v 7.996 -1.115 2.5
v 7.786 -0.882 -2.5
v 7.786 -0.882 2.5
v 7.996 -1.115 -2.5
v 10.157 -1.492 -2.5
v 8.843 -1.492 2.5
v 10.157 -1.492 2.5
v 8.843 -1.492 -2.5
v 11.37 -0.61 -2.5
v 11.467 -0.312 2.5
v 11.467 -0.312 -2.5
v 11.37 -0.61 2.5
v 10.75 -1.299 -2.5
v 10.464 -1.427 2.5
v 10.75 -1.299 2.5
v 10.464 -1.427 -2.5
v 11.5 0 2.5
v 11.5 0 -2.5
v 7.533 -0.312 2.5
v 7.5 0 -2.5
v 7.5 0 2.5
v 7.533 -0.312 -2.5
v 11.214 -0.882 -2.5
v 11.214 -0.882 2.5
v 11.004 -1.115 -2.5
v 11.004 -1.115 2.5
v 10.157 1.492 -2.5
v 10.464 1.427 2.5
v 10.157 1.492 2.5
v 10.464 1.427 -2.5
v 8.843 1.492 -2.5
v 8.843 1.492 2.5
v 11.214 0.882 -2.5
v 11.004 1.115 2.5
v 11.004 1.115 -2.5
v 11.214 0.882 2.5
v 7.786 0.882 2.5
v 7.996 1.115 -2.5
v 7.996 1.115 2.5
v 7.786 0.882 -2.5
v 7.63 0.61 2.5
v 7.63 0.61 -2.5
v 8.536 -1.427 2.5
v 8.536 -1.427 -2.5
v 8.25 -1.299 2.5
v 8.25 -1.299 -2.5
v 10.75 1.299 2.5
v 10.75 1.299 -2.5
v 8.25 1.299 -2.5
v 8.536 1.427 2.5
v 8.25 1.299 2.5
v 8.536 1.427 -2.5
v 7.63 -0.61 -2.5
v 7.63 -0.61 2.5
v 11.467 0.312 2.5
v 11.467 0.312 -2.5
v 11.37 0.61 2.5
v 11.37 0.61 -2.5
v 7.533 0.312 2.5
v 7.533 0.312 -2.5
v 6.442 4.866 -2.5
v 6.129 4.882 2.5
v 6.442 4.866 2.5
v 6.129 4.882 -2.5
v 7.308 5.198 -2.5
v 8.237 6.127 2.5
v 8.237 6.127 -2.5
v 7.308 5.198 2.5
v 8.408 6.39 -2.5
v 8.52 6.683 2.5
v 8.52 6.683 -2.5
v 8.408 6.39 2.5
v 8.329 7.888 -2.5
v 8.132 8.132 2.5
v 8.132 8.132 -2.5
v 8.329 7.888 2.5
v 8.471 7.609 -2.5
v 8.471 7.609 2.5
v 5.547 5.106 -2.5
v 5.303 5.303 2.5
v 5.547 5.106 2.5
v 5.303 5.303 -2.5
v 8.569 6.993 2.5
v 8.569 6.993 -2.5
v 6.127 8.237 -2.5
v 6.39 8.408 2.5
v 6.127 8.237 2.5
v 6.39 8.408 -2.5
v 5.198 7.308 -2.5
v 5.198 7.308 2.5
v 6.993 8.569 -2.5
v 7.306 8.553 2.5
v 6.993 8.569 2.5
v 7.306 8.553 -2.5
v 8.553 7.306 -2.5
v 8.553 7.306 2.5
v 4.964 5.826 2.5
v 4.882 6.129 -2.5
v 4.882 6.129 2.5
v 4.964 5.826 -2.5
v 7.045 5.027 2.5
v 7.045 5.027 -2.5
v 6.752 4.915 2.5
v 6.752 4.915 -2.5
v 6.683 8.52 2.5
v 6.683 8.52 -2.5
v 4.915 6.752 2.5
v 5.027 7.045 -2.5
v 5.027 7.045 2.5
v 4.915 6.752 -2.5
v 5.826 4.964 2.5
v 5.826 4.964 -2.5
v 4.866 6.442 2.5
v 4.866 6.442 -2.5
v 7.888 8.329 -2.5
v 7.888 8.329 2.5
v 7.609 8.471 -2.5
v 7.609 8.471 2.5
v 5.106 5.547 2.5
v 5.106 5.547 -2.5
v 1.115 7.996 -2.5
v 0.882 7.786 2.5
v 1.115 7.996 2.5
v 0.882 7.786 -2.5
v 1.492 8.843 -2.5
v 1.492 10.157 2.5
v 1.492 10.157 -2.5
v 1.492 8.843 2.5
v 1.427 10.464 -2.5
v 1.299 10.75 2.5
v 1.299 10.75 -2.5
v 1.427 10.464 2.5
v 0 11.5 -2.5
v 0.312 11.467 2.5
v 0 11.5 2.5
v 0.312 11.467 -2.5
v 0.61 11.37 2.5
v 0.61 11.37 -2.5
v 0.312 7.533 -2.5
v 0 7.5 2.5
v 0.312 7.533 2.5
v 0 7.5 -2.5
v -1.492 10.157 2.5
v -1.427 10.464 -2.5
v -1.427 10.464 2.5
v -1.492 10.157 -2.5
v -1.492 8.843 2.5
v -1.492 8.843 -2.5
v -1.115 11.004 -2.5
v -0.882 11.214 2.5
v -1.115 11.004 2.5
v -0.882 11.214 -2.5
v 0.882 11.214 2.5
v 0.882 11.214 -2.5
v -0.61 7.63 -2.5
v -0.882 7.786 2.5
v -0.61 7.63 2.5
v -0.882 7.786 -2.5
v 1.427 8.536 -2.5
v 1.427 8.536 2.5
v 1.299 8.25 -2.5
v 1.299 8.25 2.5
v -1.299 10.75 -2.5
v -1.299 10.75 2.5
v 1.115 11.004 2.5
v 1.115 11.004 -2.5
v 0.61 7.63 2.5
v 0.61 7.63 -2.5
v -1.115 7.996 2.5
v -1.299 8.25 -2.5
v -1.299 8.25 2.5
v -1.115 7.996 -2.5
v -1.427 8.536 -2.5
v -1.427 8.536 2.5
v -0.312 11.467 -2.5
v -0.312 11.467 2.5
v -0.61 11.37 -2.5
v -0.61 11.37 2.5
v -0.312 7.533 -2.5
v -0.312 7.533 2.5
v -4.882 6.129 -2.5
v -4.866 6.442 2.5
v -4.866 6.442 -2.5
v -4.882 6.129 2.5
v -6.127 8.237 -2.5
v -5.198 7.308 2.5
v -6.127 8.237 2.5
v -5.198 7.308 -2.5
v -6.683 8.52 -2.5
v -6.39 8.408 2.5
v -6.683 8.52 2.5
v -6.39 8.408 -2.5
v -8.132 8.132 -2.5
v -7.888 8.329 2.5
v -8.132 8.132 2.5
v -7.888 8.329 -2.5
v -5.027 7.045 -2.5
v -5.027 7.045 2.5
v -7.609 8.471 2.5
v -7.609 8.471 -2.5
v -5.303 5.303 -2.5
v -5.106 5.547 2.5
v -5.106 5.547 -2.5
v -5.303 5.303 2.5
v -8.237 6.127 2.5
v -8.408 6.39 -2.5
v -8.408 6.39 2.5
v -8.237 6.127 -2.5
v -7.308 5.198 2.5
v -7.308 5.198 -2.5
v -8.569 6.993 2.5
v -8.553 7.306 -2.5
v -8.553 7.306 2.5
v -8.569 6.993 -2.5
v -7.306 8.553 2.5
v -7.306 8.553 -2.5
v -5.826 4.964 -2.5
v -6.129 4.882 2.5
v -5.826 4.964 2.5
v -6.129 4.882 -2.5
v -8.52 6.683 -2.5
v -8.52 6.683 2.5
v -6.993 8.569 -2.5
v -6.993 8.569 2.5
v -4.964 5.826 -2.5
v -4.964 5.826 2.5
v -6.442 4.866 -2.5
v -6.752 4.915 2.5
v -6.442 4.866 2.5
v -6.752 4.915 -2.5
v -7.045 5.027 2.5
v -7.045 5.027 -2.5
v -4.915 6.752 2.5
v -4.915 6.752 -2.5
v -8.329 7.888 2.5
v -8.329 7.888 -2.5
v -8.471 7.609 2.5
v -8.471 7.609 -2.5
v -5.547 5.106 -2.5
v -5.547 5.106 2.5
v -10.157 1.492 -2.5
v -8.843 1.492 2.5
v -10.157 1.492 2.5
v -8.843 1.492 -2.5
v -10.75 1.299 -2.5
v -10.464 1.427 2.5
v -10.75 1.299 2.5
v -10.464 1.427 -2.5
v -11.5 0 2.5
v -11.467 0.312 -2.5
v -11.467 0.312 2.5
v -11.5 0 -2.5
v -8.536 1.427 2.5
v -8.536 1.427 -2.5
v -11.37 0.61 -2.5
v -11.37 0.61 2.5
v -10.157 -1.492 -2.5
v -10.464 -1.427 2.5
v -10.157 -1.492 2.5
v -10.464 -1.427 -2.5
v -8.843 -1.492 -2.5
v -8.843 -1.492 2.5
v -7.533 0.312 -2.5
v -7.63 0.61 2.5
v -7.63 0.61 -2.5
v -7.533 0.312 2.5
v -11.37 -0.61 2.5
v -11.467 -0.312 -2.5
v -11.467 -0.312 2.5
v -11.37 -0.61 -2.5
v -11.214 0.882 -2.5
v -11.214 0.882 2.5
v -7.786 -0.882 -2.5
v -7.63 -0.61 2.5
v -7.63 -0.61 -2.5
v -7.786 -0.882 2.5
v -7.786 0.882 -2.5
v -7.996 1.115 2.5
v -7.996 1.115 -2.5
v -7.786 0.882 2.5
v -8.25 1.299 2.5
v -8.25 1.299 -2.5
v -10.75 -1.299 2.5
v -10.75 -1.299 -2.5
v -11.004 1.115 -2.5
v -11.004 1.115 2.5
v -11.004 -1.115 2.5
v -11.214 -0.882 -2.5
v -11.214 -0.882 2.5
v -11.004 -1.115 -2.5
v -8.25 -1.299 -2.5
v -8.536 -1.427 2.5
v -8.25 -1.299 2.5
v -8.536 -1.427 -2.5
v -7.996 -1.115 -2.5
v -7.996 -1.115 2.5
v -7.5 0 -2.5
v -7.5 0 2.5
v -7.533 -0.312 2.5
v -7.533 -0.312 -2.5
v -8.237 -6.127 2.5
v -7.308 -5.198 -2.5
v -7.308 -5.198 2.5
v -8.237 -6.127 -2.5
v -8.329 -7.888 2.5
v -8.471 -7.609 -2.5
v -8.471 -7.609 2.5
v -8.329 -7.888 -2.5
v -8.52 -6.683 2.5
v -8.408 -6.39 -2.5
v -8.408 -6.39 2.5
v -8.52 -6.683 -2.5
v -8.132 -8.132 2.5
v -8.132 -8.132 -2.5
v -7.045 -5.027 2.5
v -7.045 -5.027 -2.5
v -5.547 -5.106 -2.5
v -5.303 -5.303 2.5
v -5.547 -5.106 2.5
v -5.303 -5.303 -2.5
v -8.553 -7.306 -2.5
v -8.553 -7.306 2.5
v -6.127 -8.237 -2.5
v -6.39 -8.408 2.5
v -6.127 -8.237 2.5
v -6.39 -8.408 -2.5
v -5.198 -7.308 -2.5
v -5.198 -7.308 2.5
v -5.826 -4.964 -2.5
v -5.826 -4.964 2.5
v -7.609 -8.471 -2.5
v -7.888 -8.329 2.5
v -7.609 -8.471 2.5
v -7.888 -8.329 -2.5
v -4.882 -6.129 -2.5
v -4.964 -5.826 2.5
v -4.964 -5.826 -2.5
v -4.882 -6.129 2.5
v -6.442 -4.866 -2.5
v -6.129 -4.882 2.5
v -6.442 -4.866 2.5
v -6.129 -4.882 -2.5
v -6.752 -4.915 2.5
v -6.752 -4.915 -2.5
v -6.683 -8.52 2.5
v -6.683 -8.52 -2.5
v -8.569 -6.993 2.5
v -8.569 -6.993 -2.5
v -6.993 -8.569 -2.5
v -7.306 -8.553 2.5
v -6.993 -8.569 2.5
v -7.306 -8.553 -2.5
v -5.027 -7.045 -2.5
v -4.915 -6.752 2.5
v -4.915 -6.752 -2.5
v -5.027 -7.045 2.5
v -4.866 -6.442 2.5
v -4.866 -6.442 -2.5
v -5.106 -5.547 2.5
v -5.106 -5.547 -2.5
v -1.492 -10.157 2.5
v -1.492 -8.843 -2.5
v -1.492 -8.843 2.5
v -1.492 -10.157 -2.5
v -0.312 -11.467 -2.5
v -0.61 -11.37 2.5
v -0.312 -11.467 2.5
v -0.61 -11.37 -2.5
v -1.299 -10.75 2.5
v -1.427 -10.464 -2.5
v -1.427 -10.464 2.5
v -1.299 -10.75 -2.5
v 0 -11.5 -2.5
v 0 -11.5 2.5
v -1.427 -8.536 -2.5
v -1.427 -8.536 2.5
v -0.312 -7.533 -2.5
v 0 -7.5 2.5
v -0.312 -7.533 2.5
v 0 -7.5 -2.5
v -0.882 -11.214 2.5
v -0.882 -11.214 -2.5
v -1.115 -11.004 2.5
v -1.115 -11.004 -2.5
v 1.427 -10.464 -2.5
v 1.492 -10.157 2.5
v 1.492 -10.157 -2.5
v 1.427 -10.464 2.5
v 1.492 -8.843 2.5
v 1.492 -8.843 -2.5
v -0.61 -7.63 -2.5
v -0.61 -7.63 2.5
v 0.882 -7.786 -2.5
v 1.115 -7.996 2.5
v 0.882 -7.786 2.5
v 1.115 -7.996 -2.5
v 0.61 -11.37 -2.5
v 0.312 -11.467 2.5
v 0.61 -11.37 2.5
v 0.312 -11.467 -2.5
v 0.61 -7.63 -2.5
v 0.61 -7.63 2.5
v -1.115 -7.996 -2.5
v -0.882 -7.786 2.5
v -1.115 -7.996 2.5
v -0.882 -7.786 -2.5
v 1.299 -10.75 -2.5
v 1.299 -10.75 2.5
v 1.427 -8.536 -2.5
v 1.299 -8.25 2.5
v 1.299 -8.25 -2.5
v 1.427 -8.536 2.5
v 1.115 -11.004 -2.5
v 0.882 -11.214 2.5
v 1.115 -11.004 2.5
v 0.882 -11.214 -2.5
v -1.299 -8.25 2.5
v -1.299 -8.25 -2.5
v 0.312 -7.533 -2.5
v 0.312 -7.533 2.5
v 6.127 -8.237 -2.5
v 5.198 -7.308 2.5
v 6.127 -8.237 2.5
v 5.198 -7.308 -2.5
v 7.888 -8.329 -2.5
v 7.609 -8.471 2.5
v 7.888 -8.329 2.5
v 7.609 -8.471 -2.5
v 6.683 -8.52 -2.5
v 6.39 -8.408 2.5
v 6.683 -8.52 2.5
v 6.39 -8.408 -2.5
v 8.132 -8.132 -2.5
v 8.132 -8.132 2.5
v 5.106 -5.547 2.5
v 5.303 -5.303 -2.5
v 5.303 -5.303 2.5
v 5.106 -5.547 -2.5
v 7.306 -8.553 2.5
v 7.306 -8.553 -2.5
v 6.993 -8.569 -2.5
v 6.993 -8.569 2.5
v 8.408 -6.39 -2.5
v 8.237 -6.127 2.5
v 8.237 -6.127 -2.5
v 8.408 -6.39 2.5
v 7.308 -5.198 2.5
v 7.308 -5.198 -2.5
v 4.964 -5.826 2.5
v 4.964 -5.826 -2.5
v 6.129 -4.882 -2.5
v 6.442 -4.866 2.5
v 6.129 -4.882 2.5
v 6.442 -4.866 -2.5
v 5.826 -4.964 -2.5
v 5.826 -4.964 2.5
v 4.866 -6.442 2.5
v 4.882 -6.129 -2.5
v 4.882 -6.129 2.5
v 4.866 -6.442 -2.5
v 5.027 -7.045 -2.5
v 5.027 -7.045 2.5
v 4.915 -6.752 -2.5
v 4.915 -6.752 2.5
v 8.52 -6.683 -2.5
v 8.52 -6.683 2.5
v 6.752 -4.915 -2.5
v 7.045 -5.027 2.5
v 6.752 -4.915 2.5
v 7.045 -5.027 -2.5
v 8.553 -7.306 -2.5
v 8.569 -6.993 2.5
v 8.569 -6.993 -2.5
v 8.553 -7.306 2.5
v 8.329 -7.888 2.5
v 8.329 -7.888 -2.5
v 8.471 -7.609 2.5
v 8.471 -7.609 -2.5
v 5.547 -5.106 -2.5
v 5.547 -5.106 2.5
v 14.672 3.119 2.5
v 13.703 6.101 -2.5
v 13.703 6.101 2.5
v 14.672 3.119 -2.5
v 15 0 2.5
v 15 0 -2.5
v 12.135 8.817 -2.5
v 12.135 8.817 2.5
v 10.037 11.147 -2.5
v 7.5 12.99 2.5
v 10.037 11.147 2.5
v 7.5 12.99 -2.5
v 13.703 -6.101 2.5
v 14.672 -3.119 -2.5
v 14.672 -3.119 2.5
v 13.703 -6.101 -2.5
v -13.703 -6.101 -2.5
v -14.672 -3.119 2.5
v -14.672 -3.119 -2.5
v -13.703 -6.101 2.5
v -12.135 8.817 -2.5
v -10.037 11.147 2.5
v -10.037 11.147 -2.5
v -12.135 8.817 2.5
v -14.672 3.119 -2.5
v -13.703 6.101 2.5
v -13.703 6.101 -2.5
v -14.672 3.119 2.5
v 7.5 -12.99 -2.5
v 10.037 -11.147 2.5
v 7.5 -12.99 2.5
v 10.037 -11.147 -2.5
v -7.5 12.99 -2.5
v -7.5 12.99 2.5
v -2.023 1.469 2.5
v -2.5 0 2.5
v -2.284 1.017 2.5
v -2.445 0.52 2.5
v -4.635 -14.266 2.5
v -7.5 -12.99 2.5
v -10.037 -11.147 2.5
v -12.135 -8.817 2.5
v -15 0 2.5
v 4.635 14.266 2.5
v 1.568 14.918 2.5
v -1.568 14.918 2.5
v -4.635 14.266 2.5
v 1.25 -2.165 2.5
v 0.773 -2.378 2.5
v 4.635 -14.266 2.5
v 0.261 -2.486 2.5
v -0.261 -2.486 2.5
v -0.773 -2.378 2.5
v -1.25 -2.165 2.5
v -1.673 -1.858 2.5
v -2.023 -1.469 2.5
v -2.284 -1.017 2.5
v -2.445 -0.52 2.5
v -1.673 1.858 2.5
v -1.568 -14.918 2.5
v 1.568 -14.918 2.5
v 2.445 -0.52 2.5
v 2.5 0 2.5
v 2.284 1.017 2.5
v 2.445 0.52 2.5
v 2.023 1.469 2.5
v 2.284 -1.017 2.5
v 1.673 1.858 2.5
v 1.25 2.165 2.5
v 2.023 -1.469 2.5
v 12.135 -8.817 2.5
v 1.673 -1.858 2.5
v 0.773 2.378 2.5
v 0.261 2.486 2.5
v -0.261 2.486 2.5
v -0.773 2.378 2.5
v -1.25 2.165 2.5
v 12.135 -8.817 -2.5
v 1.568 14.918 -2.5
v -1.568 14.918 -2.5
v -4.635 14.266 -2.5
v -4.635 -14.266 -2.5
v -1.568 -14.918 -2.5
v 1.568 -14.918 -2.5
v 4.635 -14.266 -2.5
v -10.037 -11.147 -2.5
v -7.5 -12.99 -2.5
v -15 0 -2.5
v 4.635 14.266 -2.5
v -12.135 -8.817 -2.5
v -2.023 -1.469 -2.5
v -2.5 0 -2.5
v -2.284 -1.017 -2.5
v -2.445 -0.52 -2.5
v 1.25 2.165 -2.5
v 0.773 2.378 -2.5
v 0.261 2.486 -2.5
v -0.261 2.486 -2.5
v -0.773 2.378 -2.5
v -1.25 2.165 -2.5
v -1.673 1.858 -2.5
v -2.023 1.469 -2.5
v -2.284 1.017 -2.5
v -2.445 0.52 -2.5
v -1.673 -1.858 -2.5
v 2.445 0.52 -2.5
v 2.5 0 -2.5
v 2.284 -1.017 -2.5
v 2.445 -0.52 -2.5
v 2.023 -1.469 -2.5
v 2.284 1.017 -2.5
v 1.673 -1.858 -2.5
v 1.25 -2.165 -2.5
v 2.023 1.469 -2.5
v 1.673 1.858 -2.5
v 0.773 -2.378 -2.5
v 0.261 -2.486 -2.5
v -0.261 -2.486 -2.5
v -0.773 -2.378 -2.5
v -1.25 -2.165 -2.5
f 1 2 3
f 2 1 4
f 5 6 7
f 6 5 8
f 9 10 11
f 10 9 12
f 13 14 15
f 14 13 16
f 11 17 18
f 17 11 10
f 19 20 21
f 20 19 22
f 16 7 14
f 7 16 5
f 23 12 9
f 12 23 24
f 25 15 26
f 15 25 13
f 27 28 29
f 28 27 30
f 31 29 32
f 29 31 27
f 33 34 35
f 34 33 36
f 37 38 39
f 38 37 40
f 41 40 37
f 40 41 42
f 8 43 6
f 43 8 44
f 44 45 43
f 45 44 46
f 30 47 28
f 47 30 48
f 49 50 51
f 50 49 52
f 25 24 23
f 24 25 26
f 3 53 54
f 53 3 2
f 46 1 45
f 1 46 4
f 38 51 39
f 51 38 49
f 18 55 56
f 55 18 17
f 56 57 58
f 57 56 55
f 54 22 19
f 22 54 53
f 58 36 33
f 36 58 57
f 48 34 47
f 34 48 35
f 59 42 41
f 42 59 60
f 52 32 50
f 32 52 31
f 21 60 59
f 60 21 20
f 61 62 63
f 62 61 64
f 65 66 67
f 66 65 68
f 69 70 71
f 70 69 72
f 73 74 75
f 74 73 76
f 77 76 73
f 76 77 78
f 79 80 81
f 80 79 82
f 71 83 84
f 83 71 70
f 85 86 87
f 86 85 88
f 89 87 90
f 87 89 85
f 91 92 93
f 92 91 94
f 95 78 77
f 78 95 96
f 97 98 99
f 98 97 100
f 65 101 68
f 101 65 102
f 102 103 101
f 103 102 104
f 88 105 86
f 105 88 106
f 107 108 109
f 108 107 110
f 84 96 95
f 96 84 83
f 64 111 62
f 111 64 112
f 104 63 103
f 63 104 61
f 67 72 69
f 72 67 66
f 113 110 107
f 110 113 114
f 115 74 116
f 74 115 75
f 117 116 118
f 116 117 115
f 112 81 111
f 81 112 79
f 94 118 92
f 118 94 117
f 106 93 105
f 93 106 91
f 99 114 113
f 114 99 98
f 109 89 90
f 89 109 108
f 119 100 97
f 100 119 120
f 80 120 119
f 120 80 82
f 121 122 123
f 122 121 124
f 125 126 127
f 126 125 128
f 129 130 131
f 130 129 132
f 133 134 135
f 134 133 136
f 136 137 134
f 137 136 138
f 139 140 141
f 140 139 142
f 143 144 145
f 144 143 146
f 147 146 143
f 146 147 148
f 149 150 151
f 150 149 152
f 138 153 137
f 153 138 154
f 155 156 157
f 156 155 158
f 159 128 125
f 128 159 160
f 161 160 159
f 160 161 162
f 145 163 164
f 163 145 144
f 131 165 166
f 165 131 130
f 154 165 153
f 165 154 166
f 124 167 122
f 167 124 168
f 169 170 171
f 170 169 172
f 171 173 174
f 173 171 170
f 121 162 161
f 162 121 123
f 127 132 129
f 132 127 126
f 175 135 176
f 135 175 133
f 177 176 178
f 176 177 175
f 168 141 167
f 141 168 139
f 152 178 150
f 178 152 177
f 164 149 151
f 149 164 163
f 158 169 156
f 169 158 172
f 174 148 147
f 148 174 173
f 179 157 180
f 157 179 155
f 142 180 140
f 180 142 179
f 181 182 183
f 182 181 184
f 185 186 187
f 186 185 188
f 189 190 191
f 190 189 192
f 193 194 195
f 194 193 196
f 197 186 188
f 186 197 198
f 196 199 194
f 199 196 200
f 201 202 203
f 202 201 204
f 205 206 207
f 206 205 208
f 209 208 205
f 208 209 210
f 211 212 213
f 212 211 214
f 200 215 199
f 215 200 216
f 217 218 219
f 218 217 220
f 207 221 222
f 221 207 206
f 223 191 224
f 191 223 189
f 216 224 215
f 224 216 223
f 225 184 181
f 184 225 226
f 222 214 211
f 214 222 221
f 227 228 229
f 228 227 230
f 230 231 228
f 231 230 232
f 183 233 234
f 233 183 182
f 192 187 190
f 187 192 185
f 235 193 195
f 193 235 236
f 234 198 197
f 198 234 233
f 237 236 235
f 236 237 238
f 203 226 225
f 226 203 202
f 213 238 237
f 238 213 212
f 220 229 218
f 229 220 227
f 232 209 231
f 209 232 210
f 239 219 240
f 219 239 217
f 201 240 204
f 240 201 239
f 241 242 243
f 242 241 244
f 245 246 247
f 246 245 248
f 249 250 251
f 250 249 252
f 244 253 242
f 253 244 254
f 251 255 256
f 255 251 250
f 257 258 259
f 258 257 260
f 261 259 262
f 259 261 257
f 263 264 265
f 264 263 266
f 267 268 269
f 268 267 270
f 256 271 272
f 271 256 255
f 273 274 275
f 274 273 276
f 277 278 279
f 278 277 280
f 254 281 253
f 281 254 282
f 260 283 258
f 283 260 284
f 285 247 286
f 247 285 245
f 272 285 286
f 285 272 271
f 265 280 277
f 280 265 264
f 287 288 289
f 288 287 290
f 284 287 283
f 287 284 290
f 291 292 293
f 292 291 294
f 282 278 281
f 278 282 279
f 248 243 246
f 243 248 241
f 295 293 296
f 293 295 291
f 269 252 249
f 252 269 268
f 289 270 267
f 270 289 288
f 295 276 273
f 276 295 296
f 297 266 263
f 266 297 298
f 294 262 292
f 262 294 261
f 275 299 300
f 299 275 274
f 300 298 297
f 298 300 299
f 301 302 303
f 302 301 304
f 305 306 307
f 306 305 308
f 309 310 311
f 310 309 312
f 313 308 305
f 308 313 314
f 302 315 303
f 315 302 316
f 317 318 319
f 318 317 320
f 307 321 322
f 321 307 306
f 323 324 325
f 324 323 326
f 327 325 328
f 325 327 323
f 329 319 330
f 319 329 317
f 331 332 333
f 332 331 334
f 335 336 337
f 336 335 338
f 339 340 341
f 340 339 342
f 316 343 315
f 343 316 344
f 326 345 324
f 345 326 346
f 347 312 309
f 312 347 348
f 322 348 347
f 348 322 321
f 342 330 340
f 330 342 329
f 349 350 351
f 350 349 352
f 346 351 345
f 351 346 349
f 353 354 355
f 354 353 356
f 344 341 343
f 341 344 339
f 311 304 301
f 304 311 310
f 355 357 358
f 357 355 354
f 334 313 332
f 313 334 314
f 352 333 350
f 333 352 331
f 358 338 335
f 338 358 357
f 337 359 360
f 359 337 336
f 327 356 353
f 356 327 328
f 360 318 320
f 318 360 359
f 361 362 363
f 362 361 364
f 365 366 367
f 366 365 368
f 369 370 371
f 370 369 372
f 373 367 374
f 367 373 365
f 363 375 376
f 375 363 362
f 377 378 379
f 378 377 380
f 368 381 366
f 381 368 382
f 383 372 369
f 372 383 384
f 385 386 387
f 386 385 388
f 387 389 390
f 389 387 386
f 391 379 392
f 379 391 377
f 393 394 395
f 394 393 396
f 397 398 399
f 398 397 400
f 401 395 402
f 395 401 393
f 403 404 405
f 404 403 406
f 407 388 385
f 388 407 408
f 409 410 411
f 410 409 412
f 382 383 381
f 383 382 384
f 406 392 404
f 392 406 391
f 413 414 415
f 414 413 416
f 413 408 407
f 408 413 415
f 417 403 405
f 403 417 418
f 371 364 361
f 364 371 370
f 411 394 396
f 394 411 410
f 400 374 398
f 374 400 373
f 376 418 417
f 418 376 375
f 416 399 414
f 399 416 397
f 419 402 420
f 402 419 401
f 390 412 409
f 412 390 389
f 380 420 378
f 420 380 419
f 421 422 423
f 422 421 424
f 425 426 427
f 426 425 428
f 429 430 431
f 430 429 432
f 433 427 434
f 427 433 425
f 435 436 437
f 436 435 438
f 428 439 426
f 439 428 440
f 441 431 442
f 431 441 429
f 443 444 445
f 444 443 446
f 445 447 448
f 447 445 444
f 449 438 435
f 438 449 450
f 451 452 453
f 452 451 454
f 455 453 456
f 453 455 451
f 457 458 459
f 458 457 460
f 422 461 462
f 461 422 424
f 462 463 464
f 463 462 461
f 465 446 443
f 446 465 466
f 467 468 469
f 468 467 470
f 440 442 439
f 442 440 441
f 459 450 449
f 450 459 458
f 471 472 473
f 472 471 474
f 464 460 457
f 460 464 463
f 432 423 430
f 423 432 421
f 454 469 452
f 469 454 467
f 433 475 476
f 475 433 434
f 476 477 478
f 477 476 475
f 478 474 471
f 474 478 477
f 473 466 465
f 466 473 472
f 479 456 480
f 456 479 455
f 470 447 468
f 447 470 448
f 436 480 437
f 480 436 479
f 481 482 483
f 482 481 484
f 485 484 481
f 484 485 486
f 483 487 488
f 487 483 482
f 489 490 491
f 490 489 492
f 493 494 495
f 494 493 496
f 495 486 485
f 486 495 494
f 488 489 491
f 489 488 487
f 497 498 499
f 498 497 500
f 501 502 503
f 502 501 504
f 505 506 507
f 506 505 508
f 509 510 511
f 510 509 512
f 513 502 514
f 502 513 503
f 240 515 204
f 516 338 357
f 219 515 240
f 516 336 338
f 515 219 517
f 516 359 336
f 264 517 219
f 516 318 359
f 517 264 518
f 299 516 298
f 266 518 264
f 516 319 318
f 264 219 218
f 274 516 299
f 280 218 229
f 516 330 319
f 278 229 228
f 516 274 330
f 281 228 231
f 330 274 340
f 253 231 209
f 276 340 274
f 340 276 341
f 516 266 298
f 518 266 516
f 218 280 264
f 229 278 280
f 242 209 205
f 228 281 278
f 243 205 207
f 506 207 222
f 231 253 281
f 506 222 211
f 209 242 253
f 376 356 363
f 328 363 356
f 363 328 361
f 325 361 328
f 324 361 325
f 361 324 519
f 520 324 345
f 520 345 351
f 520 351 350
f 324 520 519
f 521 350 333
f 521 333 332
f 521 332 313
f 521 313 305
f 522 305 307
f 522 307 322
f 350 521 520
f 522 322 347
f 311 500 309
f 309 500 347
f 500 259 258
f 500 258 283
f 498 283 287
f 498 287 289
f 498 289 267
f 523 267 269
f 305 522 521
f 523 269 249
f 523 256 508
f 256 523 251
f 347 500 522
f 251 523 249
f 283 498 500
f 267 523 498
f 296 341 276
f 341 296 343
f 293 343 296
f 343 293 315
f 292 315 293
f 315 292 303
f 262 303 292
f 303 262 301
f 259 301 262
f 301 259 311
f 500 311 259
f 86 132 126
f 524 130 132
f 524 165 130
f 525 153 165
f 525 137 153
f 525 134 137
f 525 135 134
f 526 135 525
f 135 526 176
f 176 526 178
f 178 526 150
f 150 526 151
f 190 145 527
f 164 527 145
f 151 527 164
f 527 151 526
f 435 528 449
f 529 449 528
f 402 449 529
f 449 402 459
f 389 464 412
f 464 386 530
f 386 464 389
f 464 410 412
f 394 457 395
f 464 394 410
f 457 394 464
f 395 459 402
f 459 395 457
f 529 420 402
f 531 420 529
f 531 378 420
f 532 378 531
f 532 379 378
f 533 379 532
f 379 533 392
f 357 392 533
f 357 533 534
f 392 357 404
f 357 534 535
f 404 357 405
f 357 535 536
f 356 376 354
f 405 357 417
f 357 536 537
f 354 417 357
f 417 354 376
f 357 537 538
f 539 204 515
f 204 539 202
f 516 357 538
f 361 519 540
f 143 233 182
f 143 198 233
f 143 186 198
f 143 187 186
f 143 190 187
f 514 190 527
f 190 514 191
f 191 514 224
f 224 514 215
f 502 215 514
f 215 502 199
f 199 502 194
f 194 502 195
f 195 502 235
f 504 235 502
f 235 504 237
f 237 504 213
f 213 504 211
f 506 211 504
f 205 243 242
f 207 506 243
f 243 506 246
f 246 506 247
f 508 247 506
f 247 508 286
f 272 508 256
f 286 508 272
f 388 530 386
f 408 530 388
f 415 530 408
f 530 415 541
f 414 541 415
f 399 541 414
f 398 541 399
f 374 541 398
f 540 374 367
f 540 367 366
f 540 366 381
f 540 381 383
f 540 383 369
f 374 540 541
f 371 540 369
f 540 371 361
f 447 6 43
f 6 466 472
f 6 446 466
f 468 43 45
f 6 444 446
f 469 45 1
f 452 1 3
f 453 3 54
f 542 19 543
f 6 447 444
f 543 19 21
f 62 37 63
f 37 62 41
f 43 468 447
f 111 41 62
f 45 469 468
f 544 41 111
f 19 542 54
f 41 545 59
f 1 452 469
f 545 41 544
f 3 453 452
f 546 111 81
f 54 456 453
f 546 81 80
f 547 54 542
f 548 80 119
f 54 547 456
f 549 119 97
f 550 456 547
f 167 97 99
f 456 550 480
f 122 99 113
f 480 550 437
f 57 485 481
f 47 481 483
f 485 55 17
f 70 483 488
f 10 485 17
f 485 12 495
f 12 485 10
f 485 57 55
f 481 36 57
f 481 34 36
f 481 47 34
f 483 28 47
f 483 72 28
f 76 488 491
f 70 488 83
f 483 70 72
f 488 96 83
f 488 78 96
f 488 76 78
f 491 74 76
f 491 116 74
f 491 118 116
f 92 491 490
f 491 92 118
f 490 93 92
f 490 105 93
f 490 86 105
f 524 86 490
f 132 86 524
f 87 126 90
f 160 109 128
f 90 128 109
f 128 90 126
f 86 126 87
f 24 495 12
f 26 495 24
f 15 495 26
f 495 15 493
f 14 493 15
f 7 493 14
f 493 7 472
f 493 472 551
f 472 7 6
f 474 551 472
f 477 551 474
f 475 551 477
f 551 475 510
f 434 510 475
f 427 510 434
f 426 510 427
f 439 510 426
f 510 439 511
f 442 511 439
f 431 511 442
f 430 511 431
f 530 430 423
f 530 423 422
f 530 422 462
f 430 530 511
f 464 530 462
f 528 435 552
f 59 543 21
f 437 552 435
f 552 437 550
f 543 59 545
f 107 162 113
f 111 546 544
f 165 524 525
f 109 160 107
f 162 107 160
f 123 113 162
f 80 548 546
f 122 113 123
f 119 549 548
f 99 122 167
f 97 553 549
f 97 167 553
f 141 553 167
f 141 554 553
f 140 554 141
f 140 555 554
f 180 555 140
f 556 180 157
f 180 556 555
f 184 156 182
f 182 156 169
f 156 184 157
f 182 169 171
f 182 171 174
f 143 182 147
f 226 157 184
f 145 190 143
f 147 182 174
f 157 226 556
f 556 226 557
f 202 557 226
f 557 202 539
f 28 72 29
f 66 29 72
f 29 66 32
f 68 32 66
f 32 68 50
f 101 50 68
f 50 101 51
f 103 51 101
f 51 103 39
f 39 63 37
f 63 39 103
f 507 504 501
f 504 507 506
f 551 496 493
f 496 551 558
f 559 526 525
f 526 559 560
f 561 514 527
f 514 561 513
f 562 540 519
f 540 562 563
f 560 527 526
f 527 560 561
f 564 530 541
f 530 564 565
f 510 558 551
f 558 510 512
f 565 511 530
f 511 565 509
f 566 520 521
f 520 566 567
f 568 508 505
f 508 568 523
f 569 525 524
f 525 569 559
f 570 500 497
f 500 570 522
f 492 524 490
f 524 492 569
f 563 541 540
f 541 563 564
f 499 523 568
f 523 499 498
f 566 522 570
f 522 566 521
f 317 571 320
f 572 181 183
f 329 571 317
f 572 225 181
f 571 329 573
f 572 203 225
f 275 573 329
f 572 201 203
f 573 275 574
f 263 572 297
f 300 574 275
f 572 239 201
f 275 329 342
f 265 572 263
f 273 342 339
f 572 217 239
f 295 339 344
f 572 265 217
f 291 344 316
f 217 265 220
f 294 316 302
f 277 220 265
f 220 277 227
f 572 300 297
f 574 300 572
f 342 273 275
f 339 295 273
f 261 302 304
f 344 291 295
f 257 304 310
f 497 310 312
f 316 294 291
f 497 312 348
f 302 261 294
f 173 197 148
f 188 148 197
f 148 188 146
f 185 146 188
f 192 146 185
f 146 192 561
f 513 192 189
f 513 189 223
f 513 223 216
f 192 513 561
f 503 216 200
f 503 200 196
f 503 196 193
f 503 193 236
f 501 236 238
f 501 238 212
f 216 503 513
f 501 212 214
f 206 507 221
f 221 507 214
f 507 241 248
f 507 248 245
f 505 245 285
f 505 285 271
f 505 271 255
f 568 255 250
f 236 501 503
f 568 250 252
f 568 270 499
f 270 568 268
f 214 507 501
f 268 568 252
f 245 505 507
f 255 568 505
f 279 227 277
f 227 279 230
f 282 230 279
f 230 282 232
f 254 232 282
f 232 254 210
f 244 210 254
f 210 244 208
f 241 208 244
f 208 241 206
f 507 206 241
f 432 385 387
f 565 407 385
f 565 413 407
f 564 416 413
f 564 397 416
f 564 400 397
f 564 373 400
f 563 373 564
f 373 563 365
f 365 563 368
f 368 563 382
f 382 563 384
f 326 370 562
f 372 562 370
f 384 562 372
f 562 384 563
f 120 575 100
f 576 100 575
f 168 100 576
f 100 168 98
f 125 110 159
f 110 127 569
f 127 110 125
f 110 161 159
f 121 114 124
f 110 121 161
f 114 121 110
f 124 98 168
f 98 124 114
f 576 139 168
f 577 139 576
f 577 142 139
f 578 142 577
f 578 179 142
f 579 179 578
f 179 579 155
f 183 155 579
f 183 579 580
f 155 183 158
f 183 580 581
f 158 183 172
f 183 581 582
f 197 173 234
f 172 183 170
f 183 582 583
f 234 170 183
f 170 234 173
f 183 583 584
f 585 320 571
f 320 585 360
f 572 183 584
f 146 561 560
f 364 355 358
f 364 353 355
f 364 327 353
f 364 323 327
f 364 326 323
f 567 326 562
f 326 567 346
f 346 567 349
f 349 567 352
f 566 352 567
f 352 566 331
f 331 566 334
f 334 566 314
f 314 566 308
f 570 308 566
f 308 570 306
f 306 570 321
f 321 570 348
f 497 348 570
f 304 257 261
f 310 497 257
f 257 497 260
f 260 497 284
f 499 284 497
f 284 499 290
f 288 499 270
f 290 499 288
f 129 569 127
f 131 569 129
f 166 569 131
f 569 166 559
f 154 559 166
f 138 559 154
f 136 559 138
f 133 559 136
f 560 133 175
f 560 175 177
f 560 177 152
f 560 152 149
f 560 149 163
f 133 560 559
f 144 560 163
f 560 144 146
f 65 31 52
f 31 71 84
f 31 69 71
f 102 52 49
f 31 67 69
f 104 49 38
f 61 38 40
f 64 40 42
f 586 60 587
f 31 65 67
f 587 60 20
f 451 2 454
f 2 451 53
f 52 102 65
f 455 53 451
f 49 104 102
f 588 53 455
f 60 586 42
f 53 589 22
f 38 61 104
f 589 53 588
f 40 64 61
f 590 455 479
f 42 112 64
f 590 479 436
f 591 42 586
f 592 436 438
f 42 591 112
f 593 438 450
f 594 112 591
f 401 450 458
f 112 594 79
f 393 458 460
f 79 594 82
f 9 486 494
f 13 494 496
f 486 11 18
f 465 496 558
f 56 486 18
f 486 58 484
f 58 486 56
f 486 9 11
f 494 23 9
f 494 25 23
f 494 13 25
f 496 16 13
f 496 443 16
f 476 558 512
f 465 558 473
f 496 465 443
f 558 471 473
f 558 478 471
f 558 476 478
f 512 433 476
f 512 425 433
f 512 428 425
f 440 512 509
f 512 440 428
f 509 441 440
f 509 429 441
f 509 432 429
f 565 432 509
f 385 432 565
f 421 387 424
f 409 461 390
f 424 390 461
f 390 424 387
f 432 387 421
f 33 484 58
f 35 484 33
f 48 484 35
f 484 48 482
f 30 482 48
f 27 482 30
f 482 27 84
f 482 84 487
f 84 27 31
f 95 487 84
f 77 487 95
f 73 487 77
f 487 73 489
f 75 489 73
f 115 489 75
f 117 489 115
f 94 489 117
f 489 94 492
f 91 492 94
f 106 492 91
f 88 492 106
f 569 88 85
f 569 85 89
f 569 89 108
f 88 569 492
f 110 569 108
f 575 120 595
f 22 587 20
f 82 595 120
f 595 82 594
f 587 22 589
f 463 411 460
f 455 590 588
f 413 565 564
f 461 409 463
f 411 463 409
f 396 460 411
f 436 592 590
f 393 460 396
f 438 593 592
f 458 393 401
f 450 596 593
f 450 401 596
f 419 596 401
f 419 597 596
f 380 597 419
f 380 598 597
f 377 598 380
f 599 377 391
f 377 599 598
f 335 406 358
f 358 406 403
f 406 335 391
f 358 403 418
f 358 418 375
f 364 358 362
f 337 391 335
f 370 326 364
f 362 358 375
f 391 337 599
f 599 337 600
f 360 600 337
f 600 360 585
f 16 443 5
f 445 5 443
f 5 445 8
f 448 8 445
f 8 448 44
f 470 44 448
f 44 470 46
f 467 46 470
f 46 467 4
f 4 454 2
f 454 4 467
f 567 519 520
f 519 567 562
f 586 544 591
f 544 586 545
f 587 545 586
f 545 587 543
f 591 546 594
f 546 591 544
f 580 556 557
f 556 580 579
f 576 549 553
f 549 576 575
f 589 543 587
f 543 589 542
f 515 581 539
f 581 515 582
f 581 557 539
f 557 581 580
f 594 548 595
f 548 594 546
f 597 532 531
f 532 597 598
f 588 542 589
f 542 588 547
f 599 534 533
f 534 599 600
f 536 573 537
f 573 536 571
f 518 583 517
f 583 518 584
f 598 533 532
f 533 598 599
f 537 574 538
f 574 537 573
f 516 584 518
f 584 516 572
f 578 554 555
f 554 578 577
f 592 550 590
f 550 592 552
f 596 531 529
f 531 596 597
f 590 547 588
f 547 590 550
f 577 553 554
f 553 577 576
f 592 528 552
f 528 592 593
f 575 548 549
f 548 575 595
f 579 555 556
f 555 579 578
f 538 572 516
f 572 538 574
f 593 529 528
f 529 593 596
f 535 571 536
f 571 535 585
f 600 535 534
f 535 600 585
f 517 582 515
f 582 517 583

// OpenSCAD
$fn = 30;

module oval_hole(length, diameter, depth) {
  hull() {
    translate([length, 0, 0]) {
      cylinder(d = diameter, depth, center = true);
    }
    cylinder(d = diameter, depth, center = true);
  }
}

module mount_holes(bolt_diam,
  inner_radius,
  outer_radius,
  hole_depth) {
  num_holes = 8;
  ang_inc = 360 / num_holes;
  for (angle = [0:ang_inc:360 - ang_inc]) {
    rotate([0, 0, angle]) {
      translate([inner_radius, 0, 0]) {
        length = outer_radius - inner_radius;
        oval_hole(length, bolt_diam, hole_depth);
      }
    }
  }
}

module motor_mount(
  inner_radius = 9,
  outer_radius = 10,
  bolt_diam = 3,
  mount_diam = 30,
  center_hole_diam = 5,
  mount_depth = 5) {

  hole_depth = mount_depth * 2 + 1;

  difference() {
    difference() {
      cylinder(d = mount_diam, mount_depth, center = true);
      mount_holes(bolt_diam, inner_radius, outer_radius, hole_depth);
    }
    cylinder(d = center_hole_diam, hole_depth, center = true);
  }
}

motor_mount();
